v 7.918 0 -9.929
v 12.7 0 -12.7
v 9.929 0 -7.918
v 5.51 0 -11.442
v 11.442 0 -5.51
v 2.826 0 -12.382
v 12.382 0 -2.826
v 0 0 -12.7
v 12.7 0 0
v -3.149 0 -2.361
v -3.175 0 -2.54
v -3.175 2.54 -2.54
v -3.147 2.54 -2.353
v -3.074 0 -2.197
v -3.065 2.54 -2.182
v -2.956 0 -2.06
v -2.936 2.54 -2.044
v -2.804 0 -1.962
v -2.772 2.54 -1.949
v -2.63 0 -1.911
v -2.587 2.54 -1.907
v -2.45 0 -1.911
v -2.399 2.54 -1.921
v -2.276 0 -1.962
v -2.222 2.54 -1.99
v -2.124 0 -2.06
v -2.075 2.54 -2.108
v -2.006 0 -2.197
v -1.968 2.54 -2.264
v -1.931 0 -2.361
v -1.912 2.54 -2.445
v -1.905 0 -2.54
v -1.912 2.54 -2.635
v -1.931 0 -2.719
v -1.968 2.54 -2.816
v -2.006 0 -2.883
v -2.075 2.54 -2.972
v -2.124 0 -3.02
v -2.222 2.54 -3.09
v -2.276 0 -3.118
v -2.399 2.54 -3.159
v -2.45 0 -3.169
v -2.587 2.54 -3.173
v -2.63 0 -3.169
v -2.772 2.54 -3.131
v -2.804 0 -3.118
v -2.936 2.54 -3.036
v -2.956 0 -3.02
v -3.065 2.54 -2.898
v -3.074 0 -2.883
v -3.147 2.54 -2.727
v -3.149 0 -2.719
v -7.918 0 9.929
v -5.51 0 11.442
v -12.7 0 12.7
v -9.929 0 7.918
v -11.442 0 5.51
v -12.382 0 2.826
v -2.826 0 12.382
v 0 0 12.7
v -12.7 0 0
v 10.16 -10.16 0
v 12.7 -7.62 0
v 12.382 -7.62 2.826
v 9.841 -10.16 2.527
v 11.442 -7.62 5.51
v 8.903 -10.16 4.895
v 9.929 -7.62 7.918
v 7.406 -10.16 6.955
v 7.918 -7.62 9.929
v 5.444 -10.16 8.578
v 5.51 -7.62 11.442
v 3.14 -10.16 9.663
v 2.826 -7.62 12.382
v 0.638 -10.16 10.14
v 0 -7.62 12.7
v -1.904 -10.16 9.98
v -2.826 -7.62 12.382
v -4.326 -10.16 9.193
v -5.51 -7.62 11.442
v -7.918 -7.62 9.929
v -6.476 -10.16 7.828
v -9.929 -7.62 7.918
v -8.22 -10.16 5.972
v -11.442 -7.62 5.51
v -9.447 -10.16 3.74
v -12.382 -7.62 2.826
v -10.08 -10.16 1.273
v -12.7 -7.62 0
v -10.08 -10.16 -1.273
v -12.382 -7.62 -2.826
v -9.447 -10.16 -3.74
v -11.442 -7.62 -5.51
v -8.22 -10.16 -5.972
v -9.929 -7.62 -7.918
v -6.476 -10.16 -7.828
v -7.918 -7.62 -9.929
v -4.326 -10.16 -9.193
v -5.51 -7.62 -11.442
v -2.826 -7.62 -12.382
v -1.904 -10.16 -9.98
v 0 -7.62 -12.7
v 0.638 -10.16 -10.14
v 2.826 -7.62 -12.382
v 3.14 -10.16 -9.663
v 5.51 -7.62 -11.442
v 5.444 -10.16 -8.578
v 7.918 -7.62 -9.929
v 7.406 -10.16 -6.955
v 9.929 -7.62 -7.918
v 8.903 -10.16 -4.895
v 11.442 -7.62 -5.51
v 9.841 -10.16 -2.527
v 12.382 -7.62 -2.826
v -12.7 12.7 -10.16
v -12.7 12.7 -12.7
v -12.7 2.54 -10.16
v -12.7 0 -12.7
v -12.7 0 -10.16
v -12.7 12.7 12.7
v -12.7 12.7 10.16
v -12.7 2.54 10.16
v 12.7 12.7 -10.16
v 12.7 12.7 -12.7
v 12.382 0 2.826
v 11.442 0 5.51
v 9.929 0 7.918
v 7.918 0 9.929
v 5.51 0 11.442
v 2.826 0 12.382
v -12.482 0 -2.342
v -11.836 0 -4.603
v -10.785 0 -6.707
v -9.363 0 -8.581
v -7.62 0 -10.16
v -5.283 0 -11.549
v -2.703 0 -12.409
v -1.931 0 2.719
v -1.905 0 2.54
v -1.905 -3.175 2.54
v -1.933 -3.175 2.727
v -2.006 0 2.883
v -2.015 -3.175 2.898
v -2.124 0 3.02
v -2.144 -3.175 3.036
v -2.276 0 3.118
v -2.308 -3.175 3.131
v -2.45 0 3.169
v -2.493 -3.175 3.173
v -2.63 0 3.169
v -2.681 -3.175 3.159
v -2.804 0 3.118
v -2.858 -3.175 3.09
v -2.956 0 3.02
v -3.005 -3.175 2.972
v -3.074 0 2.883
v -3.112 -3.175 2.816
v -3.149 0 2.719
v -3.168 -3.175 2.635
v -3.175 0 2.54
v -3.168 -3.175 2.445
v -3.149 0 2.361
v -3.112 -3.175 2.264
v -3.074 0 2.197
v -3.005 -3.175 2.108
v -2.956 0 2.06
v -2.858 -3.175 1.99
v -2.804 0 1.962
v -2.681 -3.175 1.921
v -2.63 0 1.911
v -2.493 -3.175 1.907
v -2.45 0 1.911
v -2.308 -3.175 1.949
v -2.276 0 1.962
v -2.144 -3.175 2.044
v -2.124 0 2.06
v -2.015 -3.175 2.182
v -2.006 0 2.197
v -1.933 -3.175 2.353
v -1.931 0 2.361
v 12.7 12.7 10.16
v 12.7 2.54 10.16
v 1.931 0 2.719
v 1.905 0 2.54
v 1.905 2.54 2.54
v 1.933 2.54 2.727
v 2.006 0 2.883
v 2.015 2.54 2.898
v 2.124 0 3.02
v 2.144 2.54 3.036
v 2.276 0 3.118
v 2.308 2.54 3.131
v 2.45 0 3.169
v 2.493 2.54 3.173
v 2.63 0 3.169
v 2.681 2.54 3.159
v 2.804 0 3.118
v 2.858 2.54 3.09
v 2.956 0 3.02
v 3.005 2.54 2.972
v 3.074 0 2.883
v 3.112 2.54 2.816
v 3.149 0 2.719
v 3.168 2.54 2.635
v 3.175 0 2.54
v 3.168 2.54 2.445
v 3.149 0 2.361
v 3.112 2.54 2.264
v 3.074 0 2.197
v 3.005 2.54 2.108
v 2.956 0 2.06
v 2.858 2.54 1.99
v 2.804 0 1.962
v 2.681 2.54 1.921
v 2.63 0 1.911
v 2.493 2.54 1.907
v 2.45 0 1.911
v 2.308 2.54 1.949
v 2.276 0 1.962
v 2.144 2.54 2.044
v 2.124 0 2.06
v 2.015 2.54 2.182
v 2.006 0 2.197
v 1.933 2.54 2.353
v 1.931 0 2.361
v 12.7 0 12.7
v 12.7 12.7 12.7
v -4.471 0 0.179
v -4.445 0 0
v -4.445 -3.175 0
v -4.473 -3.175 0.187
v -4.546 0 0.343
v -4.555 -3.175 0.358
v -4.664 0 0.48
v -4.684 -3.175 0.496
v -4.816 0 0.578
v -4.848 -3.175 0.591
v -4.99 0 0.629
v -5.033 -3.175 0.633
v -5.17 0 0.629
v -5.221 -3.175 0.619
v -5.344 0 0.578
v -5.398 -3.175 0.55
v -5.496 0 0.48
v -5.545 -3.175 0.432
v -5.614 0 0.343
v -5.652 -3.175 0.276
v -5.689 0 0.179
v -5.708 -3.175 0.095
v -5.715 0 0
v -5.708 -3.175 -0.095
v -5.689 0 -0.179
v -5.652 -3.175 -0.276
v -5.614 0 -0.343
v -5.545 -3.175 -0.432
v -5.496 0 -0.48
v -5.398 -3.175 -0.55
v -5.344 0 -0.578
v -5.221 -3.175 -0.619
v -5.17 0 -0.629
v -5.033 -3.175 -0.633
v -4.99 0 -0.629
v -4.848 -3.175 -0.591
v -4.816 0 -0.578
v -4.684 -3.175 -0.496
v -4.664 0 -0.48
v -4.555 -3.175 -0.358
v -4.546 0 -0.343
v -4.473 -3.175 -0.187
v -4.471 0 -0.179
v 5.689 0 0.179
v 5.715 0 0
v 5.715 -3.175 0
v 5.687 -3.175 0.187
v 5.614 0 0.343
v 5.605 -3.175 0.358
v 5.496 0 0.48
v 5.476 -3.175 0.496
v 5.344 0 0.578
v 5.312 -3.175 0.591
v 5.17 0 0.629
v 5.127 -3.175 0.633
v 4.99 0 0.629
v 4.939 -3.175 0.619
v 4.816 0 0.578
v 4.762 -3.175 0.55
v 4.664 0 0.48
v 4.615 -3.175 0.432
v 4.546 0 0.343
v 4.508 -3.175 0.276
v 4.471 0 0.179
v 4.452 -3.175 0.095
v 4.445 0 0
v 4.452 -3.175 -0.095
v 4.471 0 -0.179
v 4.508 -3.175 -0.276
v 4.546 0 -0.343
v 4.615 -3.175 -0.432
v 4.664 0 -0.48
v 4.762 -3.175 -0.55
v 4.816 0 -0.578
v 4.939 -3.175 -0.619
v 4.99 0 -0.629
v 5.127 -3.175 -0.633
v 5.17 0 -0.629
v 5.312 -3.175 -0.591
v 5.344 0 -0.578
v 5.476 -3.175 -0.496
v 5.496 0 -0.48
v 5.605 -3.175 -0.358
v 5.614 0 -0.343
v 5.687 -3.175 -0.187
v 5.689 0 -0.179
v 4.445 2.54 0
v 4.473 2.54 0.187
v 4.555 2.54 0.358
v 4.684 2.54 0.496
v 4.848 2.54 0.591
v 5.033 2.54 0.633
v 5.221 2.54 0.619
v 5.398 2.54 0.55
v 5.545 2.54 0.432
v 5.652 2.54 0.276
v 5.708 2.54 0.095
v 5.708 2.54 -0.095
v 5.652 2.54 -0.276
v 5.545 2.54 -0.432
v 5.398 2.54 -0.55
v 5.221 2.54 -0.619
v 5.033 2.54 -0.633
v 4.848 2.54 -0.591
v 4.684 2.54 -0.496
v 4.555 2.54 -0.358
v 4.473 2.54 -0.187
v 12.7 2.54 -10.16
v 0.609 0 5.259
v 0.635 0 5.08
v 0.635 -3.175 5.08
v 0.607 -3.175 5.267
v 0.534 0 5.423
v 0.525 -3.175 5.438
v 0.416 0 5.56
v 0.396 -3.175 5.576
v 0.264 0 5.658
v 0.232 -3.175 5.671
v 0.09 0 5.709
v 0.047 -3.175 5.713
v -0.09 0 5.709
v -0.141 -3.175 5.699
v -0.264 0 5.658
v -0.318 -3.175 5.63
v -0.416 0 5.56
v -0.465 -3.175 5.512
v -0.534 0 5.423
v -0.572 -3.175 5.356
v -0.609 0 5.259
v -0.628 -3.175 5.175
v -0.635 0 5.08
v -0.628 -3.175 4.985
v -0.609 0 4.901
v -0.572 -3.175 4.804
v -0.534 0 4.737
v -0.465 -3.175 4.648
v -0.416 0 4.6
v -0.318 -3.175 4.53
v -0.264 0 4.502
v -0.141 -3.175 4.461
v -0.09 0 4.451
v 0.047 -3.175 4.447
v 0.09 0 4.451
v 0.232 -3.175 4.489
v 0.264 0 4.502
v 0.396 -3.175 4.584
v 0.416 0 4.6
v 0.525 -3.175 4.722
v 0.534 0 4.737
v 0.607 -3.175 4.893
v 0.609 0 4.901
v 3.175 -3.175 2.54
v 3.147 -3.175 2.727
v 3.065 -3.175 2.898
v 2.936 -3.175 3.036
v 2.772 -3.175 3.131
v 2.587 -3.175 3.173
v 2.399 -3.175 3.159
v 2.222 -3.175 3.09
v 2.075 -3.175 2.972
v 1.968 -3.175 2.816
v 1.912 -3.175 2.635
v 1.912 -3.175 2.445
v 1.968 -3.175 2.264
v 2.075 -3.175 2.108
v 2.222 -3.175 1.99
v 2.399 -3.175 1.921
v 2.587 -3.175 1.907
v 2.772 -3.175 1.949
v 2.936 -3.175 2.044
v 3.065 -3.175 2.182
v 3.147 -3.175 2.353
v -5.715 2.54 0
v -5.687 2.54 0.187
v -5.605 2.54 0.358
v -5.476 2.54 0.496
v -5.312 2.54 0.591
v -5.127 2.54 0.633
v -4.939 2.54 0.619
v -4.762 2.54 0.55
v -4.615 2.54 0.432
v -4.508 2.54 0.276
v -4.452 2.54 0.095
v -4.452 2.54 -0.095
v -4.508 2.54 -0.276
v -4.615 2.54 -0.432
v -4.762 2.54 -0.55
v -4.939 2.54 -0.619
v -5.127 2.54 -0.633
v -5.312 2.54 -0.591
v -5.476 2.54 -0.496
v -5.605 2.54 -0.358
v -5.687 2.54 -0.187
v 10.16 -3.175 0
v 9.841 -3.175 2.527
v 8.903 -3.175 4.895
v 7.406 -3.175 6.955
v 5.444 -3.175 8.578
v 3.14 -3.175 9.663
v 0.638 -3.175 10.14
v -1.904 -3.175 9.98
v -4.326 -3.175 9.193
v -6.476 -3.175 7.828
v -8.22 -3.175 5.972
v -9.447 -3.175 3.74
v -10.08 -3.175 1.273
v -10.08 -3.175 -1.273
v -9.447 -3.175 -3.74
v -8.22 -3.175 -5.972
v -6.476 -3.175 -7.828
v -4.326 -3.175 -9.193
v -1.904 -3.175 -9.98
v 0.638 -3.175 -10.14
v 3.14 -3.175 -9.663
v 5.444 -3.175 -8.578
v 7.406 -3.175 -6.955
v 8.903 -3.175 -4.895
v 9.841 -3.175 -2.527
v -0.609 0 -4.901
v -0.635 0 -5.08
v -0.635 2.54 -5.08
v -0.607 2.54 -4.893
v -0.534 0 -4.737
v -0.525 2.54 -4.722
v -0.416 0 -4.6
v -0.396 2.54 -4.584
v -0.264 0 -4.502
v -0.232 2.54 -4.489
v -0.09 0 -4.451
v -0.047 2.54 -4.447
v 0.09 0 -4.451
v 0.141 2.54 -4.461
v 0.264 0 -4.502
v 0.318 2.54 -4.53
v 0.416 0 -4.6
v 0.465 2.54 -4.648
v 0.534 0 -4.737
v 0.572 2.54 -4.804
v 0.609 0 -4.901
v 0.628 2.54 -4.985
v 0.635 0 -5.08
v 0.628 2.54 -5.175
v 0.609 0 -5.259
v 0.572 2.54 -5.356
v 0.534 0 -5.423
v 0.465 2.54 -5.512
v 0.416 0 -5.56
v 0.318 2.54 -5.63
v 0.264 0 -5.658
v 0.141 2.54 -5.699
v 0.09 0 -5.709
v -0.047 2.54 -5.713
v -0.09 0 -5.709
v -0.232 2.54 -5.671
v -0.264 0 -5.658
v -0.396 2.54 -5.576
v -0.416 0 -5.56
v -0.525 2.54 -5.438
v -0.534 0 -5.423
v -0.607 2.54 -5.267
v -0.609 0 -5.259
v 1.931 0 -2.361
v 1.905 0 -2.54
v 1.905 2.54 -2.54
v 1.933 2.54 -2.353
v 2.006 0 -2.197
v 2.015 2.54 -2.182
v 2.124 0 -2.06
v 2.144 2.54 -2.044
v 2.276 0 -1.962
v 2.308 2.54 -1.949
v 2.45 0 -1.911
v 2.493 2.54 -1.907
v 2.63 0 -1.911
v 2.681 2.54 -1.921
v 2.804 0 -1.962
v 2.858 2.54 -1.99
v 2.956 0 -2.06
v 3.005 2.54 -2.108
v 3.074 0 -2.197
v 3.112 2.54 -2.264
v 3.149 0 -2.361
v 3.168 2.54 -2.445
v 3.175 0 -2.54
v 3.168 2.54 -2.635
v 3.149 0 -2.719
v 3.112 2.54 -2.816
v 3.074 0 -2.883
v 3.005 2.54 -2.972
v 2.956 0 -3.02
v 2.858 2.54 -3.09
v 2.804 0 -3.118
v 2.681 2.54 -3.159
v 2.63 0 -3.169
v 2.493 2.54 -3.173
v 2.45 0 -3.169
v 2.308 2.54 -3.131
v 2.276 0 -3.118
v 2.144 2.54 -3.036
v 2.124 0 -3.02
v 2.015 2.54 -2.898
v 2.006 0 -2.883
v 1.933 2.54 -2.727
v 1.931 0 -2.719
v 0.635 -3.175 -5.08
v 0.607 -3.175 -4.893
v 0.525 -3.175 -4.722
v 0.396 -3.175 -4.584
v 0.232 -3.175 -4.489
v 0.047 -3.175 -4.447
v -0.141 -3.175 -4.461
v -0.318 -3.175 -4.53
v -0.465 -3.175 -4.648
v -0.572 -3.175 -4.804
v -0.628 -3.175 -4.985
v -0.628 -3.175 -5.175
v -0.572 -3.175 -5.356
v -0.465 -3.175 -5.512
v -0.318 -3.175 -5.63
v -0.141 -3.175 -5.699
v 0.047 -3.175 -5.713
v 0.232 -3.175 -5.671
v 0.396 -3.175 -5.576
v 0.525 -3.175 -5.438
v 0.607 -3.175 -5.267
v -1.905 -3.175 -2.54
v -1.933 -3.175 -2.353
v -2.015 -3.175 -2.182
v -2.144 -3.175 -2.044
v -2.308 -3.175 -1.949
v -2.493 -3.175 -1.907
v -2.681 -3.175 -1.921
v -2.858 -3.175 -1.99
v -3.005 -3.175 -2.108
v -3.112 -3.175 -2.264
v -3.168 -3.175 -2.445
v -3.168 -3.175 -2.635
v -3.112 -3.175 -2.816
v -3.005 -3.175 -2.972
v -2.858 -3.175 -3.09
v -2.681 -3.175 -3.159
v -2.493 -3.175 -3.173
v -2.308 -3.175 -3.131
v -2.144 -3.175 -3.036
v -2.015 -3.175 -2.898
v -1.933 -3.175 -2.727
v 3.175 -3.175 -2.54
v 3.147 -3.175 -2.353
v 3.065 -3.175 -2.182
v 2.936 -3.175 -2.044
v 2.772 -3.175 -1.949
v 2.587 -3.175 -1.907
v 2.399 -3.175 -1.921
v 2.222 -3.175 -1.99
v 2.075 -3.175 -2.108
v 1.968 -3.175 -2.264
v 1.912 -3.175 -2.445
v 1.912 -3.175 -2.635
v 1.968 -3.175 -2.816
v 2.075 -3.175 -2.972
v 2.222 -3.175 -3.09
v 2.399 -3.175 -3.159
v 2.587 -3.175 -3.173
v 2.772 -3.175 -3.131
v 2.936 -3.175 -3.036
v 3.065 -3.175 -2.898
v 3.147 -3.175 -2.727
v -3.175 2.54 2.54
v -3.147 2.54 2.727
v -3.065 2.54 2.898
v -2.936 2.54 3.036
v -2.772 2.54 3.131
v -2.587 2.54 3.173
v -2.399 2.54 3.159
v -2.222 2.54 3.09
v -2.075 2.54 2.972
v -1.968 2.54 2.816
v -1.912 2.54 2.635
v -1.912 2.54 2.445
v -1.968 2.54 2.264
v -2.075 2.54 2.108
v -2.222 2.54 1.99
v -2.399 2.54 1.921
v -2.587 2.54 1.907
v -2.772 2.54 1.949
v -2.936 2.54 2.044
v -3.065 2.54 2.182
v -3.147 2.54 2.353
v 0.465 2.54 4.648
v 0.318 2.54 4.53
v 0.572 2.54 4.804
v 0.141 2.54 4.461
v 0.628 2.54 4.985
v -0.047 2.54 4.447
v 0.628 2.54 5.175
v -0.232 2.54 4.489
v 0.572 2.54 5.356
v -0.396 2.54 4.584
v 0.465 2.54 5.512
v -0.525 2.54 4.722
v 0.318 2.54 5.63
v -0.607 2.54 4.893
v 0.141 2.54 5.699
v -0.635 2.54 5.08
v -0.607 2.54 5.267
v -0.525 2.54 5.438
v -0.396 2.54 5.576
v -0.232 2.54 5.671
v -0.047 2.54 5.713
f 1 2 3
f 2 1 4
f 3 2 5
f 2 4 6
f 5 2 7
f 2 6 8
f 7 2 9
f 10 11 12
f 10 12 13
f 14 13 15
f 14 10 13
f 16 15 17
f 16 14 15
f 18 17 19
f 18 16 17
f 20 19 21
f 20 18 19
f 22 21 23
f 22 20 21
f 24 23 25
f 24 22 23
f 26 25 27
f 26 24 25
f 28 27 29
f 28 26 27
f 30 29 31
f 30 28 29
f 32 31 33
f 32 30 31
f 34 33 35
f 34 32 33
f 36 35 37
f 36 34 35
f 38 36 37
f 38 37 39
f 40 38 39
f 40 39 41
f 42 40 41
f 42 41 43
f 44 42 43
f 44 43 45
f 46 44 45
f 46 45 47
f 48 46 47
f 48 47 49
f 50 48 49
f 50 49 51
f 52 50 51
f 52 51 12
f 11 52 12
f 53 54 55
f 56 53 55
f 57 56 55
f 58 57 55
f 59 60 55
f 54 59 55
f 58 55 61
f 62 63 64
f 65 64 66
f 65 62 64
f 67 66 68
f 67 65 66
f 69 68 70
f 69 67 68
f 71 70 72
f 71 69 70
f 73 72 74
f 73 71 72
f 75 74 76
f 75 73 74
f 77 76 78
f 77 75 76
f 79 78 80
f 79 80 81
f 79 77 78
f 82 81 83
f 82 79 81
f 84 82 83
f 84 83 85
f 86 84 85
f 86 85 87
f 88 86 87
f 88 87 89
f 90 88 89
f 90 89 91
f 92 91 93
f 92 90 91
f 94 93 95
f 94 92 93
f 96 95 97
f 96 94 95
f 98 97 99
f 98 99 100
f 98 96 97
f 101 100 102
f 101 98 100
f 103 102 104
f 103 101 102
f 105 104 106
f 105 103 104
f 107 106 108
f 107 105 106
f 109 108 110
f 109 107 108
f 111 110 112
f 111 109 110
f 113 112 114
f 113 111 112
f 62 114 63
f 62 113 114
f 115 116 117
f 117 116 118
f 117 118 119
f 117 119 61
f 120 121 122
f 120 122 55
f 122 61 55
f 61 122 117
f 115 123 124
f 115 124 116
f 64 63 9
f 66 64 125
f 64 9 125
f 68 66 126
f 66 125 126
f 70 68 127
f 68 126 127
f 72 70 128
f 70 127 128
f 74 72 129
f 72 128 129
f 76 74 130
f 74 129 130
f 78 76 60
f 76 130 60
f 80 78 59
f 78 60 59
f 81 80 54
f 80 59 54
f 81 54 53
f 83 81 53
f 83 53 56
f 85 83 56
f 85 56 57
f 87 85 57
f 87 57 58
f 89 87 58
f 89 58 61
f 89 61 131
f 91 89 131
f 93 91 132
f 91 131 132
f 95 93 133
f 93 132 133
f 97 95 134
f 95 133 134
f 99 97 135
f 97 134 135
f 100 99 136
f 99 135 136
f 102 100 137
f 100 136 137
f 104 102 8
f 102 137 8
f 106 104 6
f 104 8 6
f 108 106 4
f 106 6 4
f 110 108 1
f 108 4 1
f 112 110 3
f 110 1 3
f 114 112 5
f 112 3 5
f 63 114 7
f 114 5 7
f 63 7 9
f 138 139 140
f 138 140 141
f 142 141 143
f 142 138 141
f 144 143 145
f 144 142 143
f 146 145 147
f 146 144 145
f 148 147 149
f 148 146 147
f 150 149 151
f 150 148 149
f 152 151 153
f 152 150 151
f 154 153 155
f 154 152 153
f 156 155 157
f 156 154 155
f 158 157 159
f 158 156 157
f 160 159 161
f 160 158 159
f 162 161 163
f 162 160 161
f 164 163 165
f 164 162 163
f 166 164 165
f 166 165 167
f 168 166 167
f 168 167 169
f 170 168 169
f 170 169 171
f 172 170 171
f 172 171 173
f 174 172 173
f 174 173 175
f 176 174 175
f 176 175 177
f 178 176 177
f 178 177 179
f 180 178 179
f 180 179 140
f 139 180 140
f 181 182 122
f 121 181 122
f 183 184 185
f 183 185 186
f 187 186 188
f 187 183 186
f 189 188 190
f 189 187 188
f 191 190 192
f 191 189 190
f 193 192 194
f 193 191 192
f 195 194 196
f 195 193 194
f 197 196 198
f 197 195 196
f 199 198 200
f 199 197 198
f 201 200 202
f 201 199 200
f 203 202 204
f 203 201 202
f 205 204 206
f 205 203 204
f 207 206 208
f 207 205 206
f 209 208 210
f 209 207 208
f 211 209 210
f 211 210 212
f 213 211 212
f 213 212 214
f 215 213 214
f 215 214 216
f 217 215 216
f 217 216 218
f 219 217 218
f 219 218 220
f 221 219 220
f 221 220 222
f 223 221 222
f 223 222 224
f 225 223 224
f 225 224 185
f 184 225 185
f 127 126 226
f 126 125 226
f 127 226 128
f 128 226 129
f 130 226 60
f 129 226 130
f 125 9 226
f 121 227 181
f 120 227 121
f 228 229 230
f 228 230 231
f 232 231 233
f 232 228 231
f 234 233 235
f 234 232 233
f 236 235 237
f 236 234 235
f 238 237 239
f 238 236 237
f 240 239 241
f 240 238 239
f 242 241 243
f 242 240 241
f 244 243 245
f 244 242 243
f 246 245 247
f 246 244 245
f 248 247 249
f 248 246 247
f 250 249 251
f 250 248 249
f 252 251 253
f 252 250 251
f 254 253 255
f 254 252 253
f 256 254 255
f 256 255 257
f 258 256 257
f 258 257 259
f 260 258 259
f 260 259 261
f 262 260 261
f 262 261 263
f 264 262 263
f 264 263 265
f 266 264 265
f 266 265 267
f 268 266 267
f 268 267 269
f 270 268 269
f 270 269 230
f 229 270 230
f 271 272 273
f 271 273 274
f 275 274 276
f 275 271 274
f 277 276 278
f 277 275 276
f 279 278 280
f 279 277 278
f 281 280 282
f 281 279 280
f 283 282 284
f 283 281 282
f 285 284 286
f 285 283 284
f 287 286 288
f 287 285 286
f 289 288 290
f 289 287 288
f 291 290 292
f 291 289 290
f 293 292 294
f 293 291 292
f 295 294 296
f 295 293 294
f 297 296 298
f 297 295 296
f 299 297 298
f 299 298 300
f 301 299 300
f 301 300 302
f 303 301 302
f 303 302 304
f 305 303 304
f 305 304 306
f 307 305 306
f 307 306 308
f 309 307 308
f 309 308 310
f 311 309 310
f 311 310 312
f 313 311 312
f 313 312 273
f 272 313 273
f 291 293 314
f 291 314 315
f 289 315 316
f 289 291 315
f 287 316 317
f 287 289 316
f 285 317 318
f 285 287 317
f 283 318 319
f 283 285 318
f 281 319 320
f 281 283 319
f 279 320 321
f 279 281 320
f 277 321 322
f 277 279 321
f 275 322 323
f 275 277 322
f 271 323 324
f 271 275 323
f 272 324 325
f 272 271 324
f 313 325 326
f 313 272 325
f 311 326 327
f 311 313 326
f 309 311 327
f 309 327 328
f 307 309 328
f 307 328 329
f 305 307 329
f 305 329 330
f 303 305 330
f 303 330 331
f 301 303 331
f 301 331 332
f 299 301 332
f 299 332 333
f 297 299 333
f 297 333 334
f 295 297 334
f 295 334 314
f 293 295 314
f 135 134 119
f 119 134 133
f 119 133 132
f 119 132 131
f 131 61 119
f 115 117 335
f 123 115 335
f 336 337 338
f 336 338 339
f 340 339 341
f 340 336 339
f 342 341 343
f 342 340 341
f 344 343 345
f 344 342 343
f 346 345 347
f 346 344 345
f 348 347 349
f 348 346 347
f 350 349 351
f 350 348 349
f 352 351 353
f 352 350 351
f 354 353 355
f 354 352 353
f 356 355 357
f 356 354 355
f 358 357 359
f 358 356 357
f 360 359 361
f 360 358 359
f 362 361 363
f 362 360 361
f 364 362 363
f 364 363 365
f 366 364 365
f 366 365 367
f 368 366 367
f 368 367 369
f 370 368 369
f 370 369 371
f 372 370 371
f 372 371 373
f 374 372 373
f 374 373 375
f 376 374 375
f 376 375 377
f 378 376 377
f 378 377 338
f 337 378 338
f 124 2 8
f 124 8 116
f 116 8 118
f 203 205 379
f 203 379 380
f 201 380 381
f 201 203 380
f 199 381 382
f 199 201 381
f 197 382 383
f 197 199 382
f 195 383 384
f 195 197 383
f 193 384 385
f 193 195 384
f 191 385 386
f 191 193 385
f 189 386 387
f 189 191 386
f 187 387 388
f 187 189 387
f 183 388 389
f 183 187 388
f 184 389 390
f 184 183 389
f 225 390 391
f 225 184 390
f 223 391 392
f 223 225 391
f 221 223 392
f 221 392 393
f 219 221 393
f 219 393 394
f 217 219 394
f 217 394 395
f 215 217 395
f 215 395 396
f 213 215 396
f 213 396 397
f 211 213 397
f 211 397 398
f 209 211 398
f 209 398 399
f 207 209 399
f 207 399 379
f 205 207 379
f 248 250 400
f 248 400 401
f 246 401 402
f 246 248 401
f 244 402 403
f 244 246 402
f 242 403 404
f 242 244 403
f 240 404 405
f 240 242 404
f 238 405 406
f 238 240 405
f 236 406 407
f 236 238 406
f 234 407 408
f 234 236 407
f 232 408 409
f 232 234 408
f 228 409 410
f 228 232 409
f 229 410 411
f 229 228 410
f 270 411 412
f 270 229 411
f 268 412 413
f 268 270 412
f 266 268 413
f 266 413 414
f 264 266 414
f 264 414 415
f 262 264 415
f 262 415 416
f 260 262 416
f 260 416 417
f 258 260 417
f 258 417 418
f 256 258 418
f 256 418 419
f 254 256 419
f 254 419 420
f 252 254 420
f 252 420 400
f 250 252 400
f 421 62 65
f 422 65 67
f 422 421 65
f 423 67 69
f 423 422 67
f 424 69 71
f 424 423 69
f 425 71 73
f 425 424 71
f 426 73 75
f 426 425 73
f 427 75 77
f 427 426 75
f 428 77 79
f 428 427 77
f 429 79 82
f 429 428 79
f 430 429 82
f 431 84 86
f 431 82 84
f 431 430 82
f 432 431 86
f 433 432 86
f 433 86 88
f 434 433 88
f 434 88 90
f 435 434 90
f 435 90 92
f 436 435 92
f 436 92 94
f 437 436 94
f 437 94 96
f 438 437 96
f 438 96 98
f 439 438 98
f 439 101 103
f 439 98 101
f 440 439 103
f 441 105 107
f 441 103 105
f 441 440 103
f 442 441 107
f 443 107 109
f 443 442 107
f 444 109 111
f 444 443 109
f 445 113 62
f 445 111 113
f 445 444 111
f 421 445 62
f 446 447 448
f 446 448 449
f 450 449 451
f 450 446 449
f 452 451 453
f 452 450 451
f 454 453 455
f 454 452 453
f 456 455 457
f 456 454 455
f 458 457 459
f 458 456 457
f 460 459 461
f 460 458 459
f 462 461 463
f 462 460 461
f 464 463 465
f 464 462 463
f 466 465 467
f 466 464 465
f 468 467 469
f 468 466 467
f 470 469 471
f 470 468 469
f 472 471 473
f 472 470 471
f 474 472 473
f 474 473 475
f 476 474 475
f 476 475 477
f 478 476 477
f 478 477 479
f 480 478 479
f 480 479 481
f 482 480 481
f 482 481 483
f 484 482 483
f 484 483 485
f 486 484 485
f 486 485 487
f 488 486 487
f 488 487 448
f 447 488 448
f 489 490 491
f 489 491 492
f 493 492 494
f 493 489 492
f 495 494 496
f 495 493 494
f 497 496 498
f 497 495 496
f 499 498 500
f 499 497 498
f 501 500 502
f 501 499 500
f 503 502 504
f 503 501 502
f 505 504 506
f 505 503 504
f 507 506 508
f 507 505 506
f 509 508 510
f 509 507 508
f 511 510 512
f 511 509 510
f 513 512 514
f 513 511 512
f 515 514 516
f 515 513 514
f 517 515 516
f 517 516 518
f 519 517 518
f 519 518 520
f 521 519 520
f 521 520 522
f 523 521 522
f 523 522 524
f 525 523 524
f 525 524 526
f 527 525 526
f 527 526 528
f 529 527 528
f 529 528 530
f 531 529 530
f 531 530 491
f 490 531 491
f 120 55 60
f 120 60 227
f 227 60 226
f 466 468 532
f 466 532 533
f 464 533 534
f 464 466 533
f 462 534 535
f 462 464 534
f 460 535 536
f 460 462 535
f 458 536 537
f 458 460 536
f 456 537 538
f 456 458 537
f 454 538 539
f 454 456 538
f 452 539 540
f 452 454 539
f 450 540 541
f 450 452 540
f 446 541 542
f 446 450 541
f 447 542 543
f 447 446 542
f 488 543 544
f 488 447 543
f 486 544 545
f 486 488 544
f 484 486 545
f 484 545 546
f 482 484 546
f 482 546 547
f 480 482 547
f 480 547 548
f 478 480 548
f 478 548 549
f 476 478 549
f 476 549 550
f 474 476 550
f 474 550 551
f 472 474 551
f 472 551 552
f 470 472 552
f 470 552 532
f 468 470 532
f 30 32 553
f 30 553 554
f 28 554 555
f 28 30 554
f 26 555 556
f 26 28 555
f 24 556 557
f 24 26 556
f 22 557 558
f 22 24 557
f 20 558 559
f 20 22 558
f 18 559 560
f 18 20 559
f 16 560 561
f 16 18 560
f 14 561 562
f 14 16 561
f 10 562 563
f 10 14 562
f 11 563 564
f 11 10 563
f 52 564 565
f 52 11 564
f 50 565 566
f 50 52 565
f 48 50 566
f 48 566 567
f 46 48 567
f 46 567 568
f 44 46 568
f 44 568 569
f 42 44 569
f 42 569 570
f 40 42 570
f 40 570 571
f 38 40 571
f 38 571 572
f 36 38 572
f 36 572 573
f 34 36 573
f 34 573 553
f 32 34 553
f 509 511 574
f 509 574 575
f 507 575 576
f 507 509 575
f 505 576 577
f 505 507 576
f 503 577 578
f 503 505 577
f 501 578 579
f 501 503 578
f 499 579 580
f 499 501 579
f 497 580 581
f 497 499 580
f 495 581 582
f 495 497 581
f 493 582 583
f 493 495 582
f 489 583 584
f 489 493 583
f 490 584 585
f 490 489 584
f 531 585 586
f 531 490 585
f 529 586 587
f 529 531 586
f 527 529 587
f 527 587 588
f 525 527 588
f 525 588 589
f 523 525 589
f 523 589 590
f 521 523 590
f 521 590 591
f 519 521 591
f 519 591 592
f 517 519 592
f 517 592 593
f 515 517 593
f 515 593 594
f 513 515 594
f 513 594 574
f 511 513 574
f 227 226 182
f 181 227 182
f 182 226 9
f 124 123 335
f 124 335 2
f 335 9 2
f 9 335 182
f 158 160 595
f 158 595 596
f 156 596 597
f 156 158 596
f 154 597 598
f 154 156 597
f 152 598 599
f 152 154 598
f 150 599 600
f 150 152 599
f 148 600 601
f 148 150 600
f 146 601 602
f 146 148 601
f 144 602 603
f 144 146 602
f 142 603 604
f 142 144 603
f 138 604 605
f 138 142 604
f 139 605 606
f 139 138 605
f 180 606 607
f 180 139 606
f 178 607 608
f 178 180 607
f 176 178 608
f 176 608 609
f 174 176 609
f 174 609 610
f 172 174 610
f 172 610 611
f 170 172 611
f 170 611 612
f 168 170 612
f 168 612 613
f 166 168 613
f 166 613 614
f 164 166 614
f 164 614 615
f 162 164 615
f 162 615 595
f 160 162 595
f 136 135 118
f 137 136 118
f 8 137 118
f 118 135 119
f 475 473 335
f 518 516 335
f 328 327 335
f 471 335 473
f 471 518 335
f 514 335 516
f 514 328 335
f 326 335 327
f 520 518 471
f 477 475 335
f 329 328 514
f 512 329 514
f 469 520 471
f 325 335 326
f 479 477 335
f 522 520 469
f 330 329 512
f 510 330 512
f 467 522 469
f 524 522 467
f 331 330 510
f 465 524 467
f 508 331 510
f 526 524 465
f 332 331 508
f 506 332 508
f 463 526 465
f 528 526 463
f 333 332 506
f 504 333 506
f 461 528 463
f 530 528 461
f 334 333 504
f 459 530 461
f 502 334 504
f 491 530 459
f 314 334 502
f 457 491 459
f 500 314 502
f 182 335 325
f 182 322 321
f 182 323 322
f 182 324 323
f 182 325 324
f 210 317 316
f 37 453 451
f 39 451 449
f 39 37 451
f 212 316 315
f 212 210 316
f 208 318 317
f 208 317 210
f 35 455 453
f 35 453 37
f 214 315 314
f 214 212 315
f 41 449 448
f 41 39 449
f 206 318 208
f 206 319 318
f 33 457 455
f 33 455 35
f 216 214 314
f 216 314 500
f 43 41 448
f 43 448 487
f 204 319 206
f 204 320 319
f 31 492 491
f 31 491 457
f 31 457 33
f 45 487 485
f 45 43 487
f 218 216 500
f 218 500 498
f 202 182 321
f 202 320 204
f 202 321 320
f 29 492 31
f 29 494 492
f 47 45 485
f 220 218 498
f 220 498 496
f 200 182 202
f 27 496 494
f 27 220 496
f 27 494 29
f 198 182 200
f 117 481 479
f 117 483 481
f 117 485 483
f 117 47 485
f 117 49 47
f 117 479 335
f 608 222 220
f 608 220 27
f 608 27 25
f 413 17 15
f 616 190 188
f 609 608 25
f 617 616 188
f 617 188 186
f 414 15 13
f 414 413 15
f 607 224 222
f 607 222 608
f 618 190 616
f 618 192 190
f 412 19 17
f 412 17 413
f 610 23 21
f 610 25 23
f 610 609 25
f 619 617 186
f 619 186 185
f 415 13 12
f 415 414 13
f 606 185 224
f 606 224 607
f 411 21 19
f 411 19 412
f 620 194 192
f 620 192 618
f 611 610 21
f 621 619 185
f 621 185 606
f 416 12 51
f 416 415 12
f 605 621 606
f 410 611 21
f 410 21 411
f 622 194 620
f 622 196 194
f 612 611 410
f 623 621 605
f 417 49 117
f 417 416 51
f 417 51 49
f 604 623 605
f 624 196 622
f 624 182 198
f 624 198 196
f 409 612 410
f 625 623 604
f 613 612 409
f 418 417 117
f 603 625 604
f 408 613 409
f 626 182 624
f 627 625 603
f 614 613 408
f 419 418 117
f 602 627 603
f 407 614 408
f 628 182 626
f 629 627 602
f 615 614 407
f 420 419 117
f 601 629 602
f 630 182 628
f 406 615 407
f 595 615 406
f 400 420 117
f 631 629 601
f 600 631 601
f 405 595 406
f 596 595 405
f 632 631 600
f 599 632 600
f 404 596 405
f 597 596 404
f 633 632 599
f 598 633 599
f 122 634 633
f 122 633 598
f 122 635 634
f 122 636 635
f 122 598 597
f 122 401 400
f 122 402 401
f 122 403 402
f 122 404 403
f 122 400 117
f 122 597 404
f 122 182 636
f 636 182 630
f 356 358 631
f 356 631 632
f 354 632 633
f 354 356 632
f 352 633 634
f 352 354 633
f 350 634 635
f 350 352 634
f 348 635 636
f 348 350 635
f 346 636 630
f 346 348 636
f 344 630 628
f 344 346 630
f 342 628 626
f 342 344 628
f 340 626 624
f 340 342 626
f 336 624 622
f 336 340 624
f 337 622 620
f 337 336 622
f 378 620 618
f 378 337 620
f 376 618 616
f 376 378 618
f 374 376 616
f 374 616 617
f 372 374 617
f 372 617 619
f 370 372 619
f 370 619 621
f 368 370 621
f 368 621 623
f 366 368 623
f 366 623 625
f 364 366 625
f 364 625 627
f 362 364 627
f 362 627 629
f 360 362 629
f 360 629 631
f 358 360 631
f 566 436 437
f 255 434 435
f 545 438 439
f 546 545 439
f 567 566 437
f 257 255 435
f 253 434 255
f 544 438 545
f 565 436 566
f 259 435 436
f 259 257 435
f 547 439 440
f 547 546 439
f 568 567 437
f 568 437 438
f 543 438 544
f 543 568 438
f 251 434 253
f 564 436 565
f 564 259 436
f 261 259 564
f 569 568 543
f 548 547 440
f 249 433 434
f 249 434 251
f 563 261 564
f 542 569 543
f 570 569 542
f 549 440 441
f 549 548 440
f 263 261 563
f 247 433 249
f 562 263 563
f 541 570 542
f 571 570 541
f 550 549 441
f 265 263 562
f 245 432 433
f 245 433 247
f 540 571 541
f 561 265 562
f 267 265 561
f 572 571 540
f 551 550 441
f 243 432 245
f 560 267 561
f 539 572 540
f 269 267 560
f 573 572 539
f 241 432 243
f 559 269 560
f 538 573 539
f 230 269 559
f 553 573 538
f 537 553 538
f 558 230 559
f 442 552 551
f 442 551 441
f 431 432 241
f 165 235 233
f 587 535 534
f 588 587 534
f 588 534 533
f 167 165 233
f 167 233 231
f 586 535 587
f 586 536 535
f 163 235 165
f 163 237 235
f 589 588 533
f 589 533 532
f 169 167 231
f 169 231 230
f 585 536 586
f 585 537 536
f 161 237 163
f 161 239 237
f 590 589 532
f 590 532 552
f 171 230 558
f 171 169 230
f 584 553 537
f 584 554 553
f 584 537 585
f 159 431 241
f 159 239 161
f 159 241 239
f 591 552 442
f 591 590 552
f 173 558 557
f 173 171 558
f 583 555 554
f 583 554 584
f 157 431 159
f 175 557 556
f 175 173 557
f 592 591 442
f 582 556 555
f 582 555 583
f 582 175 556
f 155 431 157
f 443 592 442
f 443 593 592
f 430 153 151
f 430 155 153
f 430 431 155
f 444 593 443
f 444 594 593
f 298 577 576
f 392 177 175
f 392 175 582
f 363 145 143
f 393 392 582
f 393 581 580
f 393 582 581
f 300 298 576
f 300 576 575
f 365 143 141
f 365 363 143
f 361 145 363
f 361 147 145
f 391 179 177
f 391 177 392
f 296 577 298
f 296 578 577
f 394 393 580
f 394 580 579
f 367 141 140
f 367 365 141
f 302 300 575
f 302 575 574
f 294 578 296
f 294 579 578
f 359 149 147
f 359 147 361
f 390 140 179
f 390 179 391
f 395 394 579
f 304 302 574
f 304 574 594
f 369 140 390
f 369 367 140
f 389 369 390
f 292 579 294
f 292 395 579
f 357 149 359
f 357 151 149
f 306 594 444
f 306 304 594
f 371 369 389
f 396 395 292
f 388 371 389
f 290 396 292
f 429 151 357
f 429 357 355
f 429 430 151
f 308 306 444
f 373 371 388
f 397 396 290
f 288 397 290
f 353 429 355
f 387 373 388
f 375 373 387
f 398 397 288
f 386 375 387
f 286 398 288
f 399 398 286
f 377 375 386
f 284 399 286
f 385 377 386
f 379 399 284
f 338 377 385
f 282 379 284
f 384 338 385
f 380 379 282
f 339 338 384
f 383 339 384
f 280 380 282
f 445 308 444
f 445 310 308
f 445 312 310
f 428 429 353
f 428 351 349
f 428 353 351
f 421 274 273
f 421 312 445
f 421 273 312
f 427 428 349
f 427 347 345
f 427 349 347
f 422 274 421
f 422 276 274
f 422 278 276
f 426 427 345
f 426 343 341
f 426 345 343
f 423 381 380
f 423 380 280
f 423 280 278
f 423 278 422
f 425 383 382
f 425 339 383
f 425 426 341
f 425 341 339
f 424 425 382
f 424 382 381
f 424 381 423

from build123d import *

# Parameters (mm, degrees)
F0_R     = 12.7
F0_R_2   = 10.16
F1_DEPTH = 12.7
F0_R_3   = 0.635
F2_DEPTH = 3.175
F4_DEPTH = 12.7
F3_R     = 0.635
F5_DEPTH = 2.54


# Not quite as in the source:
# - a fillet or chamfer that OpenCascade refuses, or shapes differently, is made with other operations: its cross-section is extruded or revolved along the edge and cut away or added


with BuildPart() as f1:
    # F0 (on Front) → F1 (new body)
    with BuildSketch(Plane.XZ):
        Circle(F0_R)
        Circle(F0_R_2, mode=Mode.SUBTRACT)
    extrude(amount=F1_DEPTH)

    # F0 (on Front) → F2 (join)
    with BuildSketch(Plane.XZ):
        Circle(F0_R_2)
        with Locations((0, -5.08)):
            Circle(F0_R_3, mode=Mode.SUBTRACT)
        with Locations((-5.08, 0)):
            Circle(F0_R_3, mode=Mode.SUBTRACT)
        with Locations((-2.54, -2.54)):
            Circle(F0_R_3, mode=Mode.SUBTRACT)
        with Locations((2.54, -2.54)):
            Circle(F0_R_3, mode=Mode.SUBTRACT)
        with Locations((5.08, 0)):
            Circle(F0_R_3, mode=Mode.SUBTRACT)
        with Locations((-2.54, 2.54)):
            Circle(F0_R_3, mode=Mode.SUBTRACT)
        with Locations((0, 5.08)):
            Circle(F0_R_3, mode=Mode.SUBTRACT)
        with Locations((2.54, 2.54)):
            Circle(F0_R_3, mode=Mode.SUBTRACT)
    extrude(amount=F2_DEPTH)

    # F3 (on face) → F4 (join)
    with BuildSketch(Plane(origin=(0, 0, 0), x_dir=(-1, 0, 0), z_dir=(0, 1, 0))):
        with BuildLine():
            ThreePointArc((-7.62, 10.16), (-4.0160926196, 12.0482778882), (1.86e-08, 12.7))
            Line((1.86e-08, 12.7), (-12.7, 12.7))
            Line((-12.7, 12.7), (-12.7, 10.16))
            Line((-12.7, 10.16), (-7.62, 10.16))
        make_face()
        with BuildLine():
            ThreePointArc((7.62, 10.16), (4.0160926372, 12.0482778823), (1.86e-08, 12.7))
            ThreePointArc((1.86e-08, 12.7), (-4.0160926196, 12.0482778882), (-7.62, 10.16))
            Line((-7.62, 10.16), (7.62, 10.16))
        make_face()
        with BuildLine():
            Line((12.7, 10.16), (12.7, 12.7))
            Line((12.7, 12.7), (1.86e-08, 12.7))
            ThreePointArc((1.86e-08, 12.7), (4.0160926372, 12.0482778823), (7.62, 10.16))
            Line((7.62, 10.16), (12.7, 10.16))
        make_face()
        with BuildLine():
            Line((12.7, -12.7), (12.7, -10.16))
            Line((12.7, -10.16), (7.62, -10.16))
            ThreePointArc((7.62, -10.16), (4.0160926284, -12.0482778852), (0, -12.7))
            Line((0, -12.7), (12.7, -12.7))
        make_face()
        with BuildLine():
            ThreePointArc((0, -12.7), (4.0160926284, -12.0482778852), (7.62, -10.16))
            Line((7.62, -10.16), (-7.62, -10.16))
            ThreePointArc((-7.62, -10.16), (-4.0160926284, -12.0482778852), (0, -12.7))
        make_face()
        with BuildLine():
            Line((-7.62, -10.16), (-12.7, -10.16))
            Line((-12.7, -10.16), (-12.7, -12.7))
            Line((-12.7, -12.7), (0, -12.7))
            ThreePointArc((0, -12.7), (-4.0160926284, -12.0482778852), (-7.62, -10.16))
        make_face()
    extrude(amount=F4_DEPTH)

    # F3 (on face) → F5 (join)
    with BuildSketch(Plane(origin=(0, 0, 0), x_dir=(-1, 0, 0), z_dir=(0, 1, 0))):
        with BuildLine():
            Line((12.7, 0), (12.7, 10.16))
            Line((12.7, 10.16), (7.62, 10.16))
            ThreePointArc((7.62, 10.16), (11.3592253257, 5.6796126628), (12.7, 0))
        make_face()
        with BuildLine():
            ThreePointArc((12.7, 0), (11.3592253257, 5.6796126628), (7.62, 10.16))
            Line((7.62, 10.16), (-7.62, 10.16))
            ThreePointArc((-7.62, 10.16), (-11.3592253257, 5.6796126628), (-12.7, 0))
            ThreePointArc((-12.7, 0), (-11.3592253257, -5.6796126628), (-7.62, -10.16))
            Line((-7.62, -10.16), (7.62, -10.16))
            ThreePointArc((7.62, -10.16), (11.3592253257, -5.6796126628), (12.7, 0))
        make_face()
        with Locations((0, -5.08)):
            Circle(F3_R, mode=Mode.SUBTRACT)
        with Locations((-5.08, 0)):
            Circle(F3_R, mode=Mode.SUBTRACT)
        with Locations((-2.54, -2.54)):
            Circle(F3_R, mode=Mode.SUBTRACT)
        with Locations((2.54, -2.54)):
            Circle(F3_R, mode=Mode.SUBTRACT)
        with Locations((5.08, 0)):
            Circle(F3_R, mode=Mode.SUBTRACT)
        with Locations((-2.54, 2.54)):
            Circle(F3_R, mode=Mode.SUBTRACT)
        with Locations((0, 5.08)):
            Circle(F3_R, mode=Mode.SUBTRACT)
        with Locations((2.54, 2.54)):
            Circle(F3_R, mode=Mode.SUBTRACT)
        with BuildLine():
            ThreePointArc((-12.7, 0), (-11.3592253257, 5.6796126628), (-7.62, 10.16))
            Line((-7.62, 10.16), (-12.7, 10.16))
            Line((-12.7, 10.16), (-12.7, 0))
        make_face()
        with BuildLine():
            Line((12.7, -10.16), (12.7, 0))
            ThreePointArc((12.7, 0), (11.3592253257, -5.6796126628), (7.62, -10.16))
            Line((7.62, -10.16), (12.7, -10.16))
        make_face()
        with BuildLine():
            ThreePointArc((-7.62, -10.16), (-11.3592253257, -5.6796126628), (-12.7, 0))
            Line((-12.7, 0), (-12.7, -10.16))
            Line((-12.7, -10.16), (-7.62, -10.16))
        make_face()
    extrude(amount=F5_DEPTH)

    # F6: chamfer of 5.08 on 1 edges, made by hand

    # F6_s1 → F6_t2 (revolve, cut)
    with BuildSketch(Plane.XY):
        Polygon((12.7, -7.62), (7.62, -12.7), (12.7, -12.7), align=None)
    revolve(axis=Axis((0, -12.7, 0), (0, -1, 0)), mode=Mode.SUBTRACT)


solid = f1.part
